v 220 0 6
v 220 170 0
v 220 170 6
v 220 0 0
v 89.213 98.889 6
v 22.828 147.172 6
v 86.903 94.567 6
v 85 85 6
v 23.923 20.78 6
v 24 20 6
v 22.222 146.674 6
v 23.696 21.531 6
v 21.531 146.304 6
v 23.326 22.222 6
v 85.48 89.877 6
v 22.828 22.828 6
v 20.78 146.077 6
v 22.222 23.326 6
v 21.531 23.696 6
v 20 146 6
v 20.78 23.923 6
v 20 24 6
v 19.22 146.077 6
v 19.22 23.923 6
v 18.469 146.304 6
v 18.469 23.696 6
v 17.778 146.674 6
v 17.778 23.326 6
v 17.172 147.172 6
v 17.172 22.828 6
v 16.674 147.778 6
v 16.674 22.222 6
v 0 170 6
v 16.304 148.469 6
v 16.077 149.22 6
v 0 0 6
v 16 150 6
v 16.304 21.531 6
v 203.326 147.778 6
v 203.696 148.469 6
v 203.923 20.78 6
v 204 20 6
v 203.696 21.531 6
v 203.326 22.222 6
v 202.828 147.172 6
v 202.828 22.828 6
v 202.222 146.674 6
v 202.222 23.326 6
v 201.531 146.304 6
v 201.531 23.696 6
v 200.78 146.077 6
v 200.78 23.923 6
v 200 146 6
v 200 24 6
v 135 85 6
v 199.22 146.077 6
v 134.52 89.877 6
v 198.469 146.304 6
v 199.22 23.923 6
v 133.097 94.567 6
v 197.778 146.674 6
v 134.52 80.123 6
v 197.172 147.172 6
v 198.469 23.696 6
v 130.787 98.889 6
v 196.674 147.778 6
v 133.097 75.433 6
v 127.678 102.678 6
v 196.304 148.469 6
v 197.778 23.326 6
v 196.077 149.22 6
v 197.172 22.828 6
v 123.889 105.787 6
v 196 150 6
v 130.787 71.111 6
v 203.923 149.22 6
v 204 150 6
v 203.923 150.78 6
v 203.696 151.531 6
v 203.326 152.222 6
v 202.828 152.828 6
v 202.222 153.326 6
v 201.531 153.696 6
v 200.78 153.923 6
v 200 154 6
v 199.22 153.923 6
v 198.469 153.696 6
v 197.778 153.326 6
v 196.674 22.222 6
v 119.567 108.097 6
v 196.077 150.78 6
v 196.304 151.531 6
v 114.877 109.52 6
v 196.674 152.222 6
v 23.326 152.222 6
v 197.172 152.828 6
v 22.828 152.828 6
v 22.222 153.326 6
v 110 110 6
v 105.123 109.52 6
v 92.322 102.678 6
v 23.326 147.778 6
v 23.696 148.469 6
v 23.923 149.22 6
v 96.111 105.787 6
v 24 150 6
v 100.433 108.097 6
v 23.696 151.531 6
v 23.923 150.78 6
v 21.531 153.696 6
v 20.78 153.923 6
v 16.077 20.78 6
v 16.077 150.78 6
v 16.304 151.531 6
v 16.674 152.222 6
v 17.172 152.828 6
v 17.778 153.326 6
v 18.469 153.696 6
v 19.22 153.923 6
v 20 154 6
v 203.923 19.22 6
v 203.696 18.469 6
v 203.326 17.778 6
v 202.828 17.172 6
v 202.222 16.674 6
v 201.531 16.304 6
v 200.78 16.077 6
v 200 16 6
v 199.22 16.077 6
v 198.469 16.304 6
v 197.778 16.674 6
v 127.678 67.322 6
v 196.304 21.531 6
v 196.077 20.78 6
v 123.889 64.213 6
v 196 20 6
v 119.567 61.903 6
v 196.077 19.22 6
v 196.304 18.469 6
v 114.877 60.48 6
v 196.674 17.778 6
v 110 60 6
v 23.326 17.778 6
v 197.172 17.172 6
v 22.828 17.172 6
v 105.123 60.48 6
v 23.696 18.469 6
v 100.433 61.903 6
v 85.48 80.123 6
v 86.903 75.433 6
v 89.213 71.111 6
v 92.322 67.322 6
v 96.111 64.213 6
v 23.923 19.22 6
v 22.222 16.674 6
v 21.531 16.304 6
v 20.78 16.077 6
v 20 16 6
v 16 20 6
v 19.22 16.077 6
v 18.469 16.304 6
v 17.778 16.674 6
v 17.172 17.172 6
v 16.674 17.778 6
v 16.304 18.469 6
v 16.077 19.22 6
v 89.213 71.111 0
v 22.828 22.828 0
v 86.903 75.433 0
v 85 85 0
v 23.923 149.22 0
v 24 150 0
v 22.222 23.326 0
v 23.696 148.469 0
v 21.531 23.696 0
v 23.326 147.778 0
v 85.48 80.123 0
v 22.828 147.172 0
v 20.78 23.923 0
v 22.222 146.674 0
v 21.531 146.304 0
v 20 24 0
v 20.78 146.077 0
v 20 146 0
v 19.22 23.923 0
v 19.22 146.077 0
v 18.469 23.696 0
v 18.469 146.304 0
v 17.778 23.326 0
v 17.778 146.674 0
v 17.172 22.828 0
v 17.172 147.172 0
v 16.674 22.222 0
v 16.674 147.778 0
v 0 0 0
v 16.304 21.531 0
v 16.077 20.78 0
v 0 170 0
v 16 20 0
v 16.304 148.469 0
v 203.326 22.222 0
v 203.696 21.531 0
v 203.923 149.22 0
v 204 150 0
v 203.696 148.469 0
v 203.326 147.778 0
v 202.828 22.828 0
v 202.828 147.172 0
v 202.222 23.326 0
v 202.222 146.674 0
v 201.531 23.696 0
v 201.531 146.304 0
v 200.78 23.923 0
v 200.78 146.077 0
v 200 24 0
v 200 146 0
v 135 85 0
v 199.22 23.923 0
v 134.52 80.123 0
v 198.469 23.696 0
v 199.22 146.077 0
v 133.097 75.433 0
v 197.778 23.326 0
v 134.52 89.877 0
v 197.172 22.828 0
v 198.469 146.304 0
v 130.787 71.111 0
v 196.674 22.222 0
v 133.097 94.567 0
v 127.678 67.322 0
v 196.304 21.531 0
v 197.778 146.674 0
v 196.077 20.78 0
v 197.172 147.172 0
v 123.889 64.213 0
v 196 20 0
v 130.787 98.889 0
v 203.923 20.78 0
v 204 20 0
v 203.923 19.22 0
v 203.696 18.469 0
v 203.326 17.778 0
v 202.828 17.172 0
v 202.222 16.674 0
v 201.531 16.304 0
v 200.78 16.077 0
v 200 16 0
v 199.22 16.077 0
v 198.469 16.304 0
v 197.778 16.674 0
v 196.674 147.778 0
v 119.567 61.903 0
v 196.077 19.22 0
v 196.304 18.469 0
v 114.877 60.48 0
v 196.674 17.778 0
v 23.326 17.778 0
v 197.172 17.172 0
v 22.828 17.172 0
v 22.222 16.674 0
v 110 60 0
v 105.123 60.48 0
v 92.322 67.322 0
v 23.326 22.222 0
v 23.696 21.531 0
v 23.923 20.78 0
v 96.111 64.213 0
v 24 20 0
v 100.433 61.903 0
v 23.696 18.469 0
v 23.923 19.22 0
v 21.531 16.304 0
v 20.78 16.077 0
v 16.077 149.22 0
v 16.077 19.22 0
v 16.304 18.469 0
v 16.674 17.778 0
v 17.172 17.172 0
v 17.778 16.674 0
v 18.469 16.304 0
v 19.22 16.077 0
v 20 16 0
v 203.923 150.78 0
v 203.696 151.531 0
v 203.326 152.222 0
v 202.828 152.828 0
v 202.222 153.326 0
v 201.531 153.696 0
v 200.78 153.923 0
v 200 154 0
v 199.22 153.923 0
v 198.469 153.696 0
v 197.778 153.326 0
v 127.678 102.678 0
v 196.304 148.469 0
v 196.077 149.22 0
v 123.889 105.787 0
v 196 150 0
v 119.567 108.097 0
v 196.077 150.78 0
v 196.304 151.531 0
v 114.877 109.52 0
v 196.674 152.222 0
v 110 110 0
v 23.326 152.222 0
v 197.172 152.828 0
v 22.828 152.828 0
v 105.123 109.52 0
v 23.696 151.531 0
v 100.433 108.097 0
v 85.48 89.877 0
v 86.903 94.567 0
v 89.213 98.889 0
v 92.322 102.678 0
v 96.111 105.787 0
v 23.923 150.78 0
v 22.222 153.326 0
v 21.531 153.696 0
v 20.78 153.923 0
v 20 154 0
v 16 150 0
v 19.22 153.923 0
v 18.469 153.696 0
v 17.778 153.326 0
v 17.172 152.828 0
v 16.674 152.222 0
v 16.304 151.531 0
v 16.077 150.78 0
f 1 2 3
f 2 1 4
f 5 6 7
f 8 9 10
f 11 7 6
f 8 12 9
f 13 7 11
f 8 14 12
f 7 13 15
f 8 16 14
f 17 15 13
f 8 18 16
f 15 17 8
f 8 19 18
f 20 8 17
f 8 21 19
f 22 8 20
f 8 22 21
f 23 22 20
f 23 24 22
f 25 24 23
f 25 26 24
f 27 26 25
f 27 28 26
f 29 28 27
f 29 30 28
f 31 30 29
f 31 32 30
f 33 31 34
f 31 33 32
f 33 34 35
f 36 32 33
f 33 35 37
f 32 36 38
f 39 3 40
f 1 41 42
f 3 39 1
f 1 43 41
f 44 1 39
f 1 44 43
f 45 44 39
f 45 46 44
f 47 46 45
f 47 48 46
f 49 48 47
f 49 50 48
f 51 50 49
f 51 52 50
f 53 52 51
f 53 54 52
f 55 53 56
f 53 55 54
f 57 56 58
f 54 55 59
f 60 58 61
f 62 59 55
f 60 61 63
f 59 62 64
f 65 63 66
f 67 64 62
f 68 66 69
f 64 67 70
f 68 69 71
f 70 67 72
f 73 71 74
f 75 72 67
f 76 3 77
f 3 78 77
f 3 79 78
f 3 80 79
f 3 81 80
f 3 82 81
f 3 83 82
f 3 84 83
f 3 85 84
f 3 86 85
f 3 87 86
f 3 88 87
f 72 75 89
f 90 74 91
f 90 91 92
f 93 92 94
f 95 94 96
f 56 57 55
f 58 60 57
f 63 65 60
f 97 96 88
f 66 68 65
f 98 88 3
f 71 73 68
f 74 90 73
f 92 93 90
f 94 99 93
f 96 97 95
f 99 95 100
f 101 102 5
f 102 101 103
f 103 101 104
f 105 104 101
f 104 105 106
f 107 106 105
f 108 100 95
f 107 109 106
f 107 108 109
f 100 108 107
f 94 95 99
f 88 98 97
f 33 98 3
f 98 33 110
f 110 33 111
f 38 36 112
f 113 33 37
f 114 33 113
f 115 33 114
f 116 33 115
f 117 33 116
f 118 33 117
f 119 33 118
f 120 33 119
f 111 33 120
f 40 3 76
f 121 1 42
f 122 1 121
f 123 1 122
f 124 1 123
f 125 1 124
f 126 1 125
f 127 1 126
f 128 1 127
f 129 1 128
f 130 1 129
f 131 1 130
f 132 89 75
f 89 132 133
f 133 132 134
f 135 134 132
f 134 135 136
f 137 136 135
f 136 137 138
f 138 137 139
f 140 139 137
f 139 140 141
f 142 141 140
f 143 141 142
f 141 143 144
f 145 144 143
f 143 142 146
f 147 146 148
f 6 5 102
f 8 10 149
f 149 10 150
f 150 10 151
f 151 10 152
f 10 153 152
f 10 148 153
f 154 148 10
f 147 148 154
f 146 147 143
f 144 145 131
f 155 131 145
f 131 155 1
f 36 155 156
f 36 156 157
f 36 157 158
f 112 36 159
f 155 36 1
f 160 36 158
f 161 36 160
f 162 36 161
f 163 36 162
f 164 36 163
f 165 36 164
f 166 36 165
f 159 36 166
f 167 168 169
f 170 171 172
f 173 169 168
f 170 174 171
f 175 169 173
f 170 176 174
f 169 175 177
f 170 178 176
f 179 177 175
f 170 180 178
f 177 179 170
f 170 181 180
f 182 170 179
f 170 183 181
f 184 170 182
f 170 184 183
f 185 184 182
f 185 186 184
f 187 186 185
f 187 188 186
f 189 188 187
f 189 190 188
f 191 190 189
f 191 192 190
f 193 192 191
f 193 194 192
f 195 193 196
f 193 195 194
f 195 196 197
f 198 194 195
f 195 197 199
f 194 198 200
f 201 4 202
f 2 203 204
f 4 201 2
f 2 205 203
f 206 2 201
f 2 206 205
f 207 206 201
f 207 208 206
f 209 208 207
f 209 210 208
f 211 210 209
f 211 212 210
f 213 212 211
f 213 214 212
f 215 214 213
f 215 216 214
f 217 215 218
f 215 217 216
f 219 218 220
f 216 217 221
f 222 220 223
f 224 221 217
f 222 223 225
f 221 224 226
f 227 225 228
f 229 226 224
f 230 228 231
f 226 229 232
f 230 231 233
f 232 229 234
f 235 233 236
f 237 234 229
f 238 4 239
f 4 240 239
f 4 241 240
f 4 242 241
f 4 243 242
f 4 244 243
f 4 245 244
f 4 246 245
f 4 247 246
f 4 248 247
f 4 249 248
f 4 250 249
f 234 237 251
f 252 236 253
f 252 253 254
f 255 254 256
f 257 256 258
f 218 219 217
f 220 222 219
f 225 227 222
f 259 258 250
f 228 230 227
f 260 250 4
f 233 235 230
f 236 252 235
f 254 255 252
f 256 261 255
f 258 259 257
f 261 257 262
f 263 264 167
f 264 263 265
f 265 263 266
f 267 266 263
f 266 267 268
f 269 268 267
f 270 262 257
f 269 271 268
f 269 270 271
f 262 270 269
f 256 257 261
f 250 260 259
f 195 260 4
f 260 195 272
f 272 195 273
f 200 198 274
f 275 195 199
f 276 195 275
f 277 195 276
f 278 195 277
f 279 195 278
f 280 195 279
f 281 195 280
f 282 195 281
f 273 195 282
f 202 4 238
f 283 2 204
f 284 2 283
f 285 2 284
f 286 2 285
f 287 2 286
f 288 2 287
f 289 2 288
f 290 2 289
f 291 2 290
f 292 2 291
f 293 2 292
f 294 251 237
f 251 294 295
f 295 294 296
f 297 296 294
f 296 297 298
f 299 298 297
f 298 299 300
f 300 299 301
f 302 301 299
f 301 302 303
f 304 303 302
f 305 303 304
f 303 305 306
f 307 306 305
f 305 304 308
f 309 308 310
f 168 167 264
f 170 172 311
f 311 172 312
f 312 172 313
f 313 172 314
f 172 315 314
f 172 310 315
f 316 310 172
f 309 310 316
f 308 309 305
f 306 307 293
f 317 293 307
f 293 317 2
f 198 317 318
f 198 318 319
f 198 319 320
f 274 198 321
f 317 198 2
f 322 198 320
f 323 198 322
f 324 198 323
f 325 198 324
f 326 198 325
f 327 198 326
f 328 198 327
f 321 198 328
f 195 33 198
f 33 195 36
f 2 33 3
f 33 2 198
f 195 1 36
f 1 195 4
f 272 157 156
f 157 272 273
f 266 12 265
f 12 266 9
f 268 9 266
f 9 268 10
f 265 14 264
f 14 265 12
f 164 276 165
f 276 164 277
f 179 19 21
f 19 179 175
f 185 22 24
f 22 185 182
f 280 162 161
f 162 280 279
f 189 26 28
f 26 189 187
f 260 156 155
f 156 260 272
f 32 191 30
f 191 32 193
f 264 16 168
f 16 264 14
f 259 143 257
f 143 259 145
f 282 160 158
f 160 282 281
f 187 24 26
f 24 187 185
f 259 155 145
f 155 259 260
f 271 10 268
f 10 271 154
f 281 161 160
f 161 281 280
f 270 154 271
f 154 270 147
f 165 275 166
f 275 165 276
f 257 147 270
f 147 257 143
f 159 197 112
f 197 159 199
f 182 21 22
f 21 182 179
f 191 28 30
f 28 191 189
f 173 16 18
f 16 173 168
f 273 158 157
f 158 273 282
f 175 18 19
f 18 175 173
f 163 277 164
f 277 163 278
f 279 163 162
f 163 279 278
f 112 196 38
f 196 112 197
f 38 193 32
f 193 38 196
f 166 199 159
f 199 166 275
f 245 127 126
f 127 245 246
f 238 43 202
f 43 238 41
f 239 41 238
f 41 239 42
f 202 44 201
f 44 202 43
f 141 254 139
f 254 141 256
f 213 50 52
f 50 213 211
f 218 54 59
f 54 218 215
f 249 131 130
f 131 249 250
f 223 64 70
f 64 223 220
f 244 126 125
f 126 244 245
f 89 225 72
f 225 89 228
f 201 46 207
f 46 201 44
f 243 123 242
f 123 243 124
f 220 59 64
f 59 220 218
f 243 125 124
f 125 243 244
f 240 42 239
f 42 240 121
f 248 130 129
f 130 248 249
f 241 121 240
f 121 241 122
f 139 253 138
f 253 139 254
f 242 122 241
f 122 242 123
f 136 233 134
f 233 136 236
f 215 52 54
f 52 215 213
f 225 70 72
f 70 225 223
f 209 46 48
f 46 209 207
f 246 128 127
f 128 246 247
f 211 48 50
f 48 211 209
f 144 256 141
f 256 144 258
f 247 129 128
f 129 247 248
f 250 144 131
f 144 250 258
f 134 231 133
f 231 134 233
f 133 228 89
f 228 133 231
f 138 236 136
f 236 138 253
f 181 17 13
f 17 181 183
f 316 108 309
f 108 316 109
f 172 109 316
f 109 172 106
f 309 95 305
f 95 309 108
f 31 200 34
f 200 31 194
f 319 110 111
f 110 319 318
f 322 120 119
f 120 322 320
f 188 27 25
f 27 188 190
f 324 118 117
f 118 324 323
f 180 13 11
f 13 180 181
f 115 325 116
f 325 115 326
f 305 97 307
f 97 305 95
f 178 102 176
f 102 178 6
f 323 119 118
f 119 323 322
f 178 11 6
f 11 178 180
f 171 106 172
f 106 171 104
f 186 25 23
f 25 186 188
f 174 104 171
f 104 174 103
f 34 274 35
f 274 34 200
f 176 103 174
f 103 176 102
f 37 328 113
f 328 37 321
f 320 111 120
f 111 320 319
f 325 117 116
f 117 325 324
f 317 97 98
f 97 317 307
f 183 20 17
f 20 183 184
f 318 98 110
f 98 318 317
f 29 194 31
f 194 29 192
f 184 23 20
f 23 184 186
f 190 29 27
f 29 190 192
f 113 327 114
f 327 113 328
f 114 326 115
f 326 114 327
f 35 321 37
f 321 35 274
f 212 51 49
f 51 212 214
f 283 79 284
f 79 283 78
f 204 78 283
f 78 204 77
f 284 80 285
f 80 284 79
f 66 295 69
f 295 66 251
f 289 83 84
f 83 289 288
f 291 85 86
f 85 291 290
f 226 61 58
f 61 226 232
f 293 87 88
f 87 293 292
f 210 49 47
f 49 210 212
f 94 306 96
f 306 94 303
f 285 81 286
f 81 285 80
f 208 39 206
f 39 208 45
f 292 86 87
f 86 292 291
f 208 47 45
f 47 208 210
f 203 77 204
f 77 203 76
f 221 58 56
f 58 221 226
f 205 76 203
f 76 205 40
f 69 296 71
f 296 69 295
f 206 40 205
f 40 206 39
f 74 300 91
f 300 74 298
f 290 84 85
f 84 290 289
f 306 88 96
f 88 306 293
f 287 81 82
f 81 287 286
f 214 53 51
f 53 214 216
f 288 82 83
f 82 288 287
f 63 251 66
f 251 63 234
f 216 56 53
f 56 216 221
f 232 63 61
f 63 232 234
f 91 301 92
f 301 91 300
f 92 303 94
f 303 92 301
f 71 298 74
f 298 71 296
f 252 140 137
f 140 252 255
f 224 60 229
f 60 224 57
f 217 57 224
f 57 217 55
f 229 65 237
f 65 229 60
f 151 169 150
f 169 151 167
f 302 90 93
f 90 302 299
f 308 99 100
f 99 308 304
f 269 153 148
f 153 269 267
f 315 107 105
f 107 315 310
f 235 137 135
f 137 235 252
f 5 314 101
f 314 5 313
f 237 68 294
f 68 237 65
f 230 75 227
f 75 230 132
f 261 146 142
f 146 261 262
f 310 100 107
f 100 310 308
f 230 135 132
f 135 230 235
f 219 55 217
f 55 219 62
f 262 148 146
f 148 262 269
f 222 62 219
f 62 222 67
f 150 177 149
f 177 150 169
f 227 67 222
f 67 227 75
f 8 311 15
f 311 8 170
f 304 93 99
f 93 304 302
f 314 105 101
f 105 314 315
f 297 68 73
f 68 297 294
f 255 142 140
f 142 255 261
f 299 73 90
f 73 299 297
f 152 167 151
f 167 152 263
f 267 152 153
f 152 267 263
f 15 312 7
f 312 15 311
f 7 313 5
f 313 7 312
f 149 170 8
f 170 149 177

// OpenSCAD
$fn = 32;

// ----------------------------------------------------------------------
// Big plate: 200-250 mm adapter plate
// ----------------------------------------------------------------------

// --- parameters (mm) ---
plate_l = 220;            // plate length, X
plate_w = 170;            // plate width, Y
plate_t = 6;              // plate thickness, Z
corner_d = 8;             // corner hole diameter
corner_in = 20;           // corner hole inset from the edges
bore_d = 50;              // central bore

difference() {
  cube([plate_l, plate_w, plate_t]);
  translate([corner_in, corner_in, -1]) cylinder(h = plate_t + 2, d = corner_d);
  translate([plate_l - corner_in, corner_in, -1]) cylinder(h = plate_t + 2, d = corner_d);
  translate([corner_in, plate_w - corner_in, -1]) cylinder(h = plate_t + 2, d = corner_d);
  translate([plate_l - corner_in, plate_w - corner_in, -1]) cylinder(h = plate_t + 2, d = corner_d);
  translate([plate_l / 2, plate_w / 2, -1]) cylinder(h = plate_t + 2, d = bore_d);
}
